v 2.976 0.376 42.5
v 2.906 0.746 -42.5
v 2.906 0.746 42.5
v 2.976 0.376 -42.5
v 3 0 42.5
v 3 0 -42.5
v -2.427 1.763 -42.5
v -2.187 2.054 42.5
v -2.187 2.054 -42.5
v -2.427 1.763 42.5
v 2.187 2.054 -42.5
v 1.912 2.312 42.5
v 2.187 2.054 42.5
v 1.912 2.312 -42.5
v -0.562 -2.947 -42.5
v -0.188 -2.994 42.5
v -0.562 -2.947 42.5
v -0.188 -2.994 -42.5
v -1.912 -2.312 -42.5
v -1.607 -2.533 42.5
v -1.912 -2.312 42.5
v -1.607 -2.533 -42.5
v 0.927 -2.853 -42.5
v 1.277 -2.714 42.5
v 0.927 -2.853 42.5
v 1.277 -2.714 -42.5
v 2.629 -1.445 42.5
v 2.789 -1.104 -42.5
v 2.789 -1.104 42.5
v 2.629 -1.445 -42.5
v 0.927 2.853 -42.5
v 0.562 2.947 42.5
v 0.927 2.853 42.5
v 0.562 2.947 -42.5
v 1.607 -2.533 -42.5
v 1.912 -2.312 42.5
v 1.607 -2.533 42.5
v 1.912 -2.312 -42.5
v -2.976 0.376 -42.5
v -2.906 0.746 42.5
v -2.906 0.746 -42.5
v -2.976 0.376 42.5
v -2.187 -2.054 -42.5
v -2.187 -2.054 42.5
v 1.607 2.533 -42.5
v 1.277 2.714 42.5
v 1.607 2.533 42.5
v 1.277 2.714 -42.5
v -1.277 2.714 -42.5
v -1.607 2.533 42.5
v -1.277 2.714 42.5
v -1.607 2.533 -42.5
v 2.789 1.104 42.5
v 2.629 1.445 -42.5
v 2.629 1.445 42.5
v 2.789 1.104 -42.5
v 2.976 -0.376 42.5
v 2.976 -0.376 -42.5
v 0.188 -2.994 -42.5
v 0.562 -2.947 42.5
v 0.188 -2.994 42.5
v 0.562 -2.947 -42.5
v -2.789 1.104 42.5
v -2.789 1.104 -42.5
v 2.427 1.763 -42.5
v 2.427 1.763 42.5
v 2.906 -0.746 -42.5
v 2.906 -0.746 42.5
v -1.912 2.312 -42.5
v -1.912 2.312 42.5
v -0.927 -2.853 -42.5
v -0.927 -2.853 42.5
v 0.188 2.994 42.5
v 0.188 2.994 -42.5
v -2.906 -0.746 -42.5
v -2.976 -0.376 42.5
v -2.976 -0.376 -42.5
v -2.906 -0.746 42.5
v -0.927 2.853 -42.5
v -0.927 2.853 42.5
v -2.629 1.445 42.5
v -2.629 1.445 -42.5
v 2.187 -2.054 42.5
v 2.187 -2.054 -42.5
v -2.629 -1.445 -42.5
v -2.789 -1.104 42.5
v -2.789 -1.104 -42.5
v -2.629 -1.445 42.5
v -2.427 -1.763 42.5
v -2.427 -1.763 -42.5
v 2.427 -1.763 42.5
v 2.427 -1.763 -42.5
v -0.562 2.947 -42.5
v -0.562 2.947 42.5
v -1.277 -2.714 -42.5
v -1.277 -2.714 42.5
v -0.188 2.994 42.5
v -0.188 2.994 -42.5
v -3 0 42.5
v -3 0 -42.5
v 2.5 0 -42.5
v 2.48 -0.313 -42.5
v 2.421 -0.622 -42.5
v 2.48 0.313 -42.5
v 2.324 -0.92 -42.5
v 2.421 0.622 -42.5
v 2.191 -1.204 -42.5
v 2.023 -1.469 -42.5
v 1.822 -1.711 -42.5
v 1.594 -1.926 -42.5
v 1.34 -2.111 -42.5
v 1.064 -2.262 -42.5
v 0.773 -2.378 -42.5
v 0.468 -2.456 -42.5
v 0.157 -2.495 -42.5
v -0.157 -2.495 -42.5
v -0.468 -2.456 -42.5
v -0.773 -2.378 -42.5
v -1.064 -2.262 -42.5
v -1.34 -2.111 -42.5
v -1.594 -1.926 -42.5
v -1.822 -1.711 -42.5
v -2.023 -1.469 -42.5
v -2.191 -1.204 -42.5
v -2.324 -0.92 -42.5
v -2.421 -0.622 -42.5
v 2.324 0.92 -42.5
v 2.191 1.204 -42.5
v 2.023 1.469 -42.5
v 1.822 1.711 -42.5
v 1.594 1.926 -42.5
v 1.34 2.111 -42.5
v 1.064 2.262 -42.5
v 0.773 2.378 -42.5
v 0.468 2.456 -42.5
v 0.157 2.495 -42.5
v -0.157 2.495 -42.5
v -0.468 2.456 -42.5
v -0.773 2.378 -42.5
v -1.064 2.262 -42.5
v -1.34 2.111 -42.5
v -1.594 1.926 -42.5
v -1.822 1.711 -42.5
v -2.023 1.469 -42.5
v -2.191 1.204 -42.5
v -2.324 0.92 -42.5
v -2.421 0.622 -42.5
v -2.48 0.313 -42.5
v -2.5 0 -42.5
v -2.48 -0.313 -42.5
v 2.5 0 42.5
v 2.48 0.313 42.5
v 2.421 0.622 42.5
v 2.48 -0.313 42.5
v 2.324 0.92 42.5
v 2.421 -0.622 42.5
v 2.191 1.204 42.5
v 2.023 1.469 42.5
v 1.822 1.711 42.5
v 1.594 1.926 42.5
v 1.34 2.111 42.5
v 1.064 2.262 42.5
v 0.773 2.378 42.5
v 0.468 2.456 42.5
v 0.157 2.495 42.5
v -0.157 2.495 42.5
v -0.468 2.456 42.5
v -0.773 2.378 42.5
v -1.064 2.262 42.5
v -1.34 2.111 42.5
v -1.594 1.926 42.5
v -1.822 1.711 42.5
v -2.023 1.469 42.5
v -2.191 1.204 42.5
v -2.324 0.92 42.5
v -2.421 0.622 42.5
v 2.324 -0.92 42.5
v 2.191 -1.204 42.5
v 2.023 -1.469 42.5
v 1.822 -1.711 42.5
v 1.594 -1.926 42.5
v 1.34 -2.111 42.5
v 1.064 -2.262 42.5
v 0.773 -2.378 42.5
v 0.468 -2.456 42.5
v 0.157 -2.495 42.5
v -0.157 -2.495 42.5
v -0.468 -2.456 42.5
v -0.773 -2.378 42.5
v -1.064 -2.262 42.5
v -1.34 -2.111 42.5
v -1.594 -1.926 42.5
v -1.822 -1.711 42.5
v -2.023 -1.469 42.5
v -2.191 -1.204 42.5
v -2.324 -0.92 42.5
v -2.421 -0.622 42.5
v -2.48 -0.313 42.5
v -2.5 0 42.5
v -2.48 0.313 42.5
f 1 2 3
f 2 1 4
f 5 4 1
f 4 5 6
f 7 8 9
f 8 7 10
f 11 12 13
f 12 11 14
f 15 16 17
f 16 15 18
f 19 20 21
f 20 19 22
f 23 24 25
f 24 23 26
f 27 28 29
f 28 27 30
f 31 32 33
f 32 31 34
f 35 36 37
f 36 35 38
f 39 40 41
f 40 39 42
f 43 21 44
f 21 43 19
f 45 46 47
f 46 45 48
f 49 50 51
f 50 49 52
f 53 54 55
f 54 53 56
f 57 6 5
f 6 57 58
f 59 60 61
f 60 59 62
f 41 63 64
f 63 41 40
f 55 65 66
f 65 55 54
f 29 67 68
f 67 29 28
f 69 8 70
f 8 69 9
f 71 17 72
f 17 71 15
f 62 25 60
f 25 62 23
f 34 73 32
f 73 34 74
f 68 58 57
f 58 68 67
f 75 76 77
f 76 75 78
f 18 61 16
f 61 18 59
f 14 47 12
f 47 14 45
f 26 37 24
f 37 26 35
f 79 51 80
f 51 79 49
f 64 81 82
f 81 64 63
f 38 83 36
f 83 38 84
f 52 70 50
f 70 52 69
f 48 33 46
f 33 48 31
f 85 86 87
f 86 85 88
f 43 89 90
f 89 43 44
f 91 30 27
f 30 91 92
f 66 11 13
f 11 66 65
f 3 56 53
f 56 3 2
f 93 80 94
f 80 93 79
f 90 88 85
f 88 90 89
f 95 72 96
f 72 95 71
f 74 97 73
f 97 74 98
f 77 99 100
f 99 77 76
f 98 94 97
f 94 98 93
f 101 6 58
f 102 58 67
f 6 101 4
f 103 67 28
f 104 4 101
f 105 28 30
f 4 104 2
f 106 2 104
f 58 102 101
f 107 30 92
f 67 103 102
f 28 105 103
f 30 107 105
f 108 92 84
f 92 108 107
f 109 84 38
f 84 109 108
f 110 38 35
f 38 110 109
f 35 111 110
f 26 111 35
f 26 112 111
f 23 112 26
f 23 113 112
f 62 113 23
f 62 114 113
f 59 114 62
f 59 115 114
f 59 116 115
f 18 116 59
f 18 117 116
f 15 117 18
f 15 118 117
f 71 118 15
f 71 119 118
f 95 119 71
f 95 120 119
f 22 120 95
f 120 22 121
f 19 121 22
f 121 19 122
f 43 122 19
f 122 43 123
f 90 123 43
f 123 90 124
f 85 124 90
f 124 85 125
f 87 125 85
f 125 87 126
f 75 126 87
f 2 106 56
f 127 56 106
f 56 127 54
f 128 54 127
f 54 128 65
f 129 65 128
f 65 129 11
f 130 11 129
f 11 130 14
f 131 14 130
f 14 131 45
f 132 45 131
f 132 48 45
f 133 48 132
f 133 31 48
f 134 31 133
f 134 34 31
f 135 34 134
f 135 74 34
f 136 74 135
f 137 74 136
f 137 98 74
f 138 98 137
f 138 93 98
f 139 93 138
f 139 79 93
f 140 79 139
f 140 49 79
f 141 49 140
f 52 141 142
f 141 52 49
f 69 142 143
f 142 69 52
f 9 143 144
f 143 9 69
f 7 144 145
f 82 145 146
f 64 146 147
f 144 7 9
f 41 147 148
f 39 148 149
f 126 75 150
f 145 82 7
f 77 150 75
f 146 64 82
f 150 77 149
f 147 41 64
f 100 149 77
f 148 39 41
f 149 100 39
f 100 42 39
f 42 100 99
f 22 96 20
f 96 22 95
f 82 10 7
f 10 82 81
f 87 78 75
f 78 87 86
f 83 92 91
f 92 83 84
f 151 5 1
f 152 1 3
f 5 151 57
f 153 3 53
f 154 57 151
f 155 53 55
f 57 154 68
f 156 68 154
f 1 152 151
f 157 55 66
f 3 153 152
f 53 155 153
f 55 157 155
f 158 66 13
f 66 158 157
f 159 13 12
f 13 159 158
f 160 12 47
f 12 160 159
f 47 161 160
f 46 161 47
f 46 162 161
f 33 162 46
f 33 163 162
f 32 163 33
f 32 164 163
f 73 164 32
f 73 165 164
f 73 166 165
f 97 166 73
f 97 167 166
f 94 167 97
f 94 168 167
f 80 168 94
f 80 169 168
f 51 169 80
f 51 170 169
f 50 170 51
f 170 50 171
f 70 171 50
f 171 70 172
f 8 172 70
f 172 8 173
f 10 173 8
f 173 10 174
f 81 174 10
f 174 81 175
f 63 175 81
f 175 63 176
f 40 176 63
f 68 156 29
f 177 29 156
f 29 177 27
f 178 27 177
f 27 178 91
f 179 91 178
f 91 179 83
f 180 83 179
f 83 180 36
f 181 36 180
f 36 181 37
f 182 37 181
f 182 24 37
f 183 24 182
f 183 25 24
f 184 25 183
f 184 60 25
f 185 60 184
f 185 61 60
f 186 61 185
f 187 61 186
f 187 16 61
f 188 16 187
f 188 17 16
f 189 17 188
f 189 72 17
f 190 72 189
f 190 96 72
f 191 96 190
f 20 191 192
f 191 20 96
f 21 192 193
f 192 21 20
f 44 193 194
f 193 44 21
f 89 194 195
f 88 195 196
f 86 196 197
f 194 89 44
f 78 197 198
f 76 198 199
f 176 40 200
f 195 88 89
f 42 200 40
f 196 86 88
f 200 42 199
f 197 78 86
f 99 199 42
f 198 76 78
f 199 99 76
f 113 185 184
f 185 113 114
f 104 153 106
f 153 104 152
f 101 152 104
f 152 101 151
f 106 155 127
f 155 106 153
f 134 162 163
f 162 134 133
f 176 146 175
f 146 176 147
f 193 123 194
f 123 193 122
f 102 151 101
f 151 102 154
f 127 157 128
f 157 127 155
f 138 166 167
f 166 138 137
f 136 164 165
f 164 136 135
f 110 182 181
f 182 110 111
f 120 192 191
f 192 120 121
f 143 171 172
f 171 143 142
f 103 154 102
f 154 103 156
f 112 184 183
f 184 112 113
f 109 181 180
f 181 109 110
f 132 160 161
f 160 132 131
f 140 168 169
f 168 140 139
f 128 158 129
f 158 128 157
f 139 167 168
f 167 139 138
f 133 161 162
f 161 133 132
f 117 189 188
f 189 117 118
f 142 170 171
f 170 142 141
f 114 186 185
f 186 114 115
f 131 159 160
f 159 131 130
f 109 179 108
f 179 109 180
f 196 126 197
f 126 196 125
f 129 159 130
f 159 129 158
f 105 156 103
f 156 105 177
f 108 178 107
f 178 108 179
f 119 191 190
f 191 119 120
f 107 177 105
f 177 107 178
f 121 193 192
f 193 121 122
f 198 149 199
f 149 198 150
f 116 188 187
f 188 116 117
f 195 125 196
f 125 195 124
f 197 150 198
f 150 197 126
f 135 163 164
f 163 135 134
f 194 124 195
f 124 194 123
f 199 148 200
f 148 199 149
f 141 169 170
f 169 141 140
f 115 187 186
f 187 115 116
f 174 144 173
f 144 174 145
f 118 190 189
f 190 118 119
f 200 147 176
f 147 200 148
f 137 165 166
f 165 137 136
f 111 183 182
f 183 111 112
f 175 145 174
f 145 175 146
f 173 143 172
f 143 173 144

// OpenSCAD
$fn = 50;


difference() {
	union() {
		translate(v = [0, 0, -42.5000000000]) {
			cylinder(h = 85, r = 3.0000000000);
		}
	}
	union() {
		translate(v = [0, 0, -100.0000000000]) {
			cylinder(h = 200, r = 2.5000000000);
		}
	}
}
